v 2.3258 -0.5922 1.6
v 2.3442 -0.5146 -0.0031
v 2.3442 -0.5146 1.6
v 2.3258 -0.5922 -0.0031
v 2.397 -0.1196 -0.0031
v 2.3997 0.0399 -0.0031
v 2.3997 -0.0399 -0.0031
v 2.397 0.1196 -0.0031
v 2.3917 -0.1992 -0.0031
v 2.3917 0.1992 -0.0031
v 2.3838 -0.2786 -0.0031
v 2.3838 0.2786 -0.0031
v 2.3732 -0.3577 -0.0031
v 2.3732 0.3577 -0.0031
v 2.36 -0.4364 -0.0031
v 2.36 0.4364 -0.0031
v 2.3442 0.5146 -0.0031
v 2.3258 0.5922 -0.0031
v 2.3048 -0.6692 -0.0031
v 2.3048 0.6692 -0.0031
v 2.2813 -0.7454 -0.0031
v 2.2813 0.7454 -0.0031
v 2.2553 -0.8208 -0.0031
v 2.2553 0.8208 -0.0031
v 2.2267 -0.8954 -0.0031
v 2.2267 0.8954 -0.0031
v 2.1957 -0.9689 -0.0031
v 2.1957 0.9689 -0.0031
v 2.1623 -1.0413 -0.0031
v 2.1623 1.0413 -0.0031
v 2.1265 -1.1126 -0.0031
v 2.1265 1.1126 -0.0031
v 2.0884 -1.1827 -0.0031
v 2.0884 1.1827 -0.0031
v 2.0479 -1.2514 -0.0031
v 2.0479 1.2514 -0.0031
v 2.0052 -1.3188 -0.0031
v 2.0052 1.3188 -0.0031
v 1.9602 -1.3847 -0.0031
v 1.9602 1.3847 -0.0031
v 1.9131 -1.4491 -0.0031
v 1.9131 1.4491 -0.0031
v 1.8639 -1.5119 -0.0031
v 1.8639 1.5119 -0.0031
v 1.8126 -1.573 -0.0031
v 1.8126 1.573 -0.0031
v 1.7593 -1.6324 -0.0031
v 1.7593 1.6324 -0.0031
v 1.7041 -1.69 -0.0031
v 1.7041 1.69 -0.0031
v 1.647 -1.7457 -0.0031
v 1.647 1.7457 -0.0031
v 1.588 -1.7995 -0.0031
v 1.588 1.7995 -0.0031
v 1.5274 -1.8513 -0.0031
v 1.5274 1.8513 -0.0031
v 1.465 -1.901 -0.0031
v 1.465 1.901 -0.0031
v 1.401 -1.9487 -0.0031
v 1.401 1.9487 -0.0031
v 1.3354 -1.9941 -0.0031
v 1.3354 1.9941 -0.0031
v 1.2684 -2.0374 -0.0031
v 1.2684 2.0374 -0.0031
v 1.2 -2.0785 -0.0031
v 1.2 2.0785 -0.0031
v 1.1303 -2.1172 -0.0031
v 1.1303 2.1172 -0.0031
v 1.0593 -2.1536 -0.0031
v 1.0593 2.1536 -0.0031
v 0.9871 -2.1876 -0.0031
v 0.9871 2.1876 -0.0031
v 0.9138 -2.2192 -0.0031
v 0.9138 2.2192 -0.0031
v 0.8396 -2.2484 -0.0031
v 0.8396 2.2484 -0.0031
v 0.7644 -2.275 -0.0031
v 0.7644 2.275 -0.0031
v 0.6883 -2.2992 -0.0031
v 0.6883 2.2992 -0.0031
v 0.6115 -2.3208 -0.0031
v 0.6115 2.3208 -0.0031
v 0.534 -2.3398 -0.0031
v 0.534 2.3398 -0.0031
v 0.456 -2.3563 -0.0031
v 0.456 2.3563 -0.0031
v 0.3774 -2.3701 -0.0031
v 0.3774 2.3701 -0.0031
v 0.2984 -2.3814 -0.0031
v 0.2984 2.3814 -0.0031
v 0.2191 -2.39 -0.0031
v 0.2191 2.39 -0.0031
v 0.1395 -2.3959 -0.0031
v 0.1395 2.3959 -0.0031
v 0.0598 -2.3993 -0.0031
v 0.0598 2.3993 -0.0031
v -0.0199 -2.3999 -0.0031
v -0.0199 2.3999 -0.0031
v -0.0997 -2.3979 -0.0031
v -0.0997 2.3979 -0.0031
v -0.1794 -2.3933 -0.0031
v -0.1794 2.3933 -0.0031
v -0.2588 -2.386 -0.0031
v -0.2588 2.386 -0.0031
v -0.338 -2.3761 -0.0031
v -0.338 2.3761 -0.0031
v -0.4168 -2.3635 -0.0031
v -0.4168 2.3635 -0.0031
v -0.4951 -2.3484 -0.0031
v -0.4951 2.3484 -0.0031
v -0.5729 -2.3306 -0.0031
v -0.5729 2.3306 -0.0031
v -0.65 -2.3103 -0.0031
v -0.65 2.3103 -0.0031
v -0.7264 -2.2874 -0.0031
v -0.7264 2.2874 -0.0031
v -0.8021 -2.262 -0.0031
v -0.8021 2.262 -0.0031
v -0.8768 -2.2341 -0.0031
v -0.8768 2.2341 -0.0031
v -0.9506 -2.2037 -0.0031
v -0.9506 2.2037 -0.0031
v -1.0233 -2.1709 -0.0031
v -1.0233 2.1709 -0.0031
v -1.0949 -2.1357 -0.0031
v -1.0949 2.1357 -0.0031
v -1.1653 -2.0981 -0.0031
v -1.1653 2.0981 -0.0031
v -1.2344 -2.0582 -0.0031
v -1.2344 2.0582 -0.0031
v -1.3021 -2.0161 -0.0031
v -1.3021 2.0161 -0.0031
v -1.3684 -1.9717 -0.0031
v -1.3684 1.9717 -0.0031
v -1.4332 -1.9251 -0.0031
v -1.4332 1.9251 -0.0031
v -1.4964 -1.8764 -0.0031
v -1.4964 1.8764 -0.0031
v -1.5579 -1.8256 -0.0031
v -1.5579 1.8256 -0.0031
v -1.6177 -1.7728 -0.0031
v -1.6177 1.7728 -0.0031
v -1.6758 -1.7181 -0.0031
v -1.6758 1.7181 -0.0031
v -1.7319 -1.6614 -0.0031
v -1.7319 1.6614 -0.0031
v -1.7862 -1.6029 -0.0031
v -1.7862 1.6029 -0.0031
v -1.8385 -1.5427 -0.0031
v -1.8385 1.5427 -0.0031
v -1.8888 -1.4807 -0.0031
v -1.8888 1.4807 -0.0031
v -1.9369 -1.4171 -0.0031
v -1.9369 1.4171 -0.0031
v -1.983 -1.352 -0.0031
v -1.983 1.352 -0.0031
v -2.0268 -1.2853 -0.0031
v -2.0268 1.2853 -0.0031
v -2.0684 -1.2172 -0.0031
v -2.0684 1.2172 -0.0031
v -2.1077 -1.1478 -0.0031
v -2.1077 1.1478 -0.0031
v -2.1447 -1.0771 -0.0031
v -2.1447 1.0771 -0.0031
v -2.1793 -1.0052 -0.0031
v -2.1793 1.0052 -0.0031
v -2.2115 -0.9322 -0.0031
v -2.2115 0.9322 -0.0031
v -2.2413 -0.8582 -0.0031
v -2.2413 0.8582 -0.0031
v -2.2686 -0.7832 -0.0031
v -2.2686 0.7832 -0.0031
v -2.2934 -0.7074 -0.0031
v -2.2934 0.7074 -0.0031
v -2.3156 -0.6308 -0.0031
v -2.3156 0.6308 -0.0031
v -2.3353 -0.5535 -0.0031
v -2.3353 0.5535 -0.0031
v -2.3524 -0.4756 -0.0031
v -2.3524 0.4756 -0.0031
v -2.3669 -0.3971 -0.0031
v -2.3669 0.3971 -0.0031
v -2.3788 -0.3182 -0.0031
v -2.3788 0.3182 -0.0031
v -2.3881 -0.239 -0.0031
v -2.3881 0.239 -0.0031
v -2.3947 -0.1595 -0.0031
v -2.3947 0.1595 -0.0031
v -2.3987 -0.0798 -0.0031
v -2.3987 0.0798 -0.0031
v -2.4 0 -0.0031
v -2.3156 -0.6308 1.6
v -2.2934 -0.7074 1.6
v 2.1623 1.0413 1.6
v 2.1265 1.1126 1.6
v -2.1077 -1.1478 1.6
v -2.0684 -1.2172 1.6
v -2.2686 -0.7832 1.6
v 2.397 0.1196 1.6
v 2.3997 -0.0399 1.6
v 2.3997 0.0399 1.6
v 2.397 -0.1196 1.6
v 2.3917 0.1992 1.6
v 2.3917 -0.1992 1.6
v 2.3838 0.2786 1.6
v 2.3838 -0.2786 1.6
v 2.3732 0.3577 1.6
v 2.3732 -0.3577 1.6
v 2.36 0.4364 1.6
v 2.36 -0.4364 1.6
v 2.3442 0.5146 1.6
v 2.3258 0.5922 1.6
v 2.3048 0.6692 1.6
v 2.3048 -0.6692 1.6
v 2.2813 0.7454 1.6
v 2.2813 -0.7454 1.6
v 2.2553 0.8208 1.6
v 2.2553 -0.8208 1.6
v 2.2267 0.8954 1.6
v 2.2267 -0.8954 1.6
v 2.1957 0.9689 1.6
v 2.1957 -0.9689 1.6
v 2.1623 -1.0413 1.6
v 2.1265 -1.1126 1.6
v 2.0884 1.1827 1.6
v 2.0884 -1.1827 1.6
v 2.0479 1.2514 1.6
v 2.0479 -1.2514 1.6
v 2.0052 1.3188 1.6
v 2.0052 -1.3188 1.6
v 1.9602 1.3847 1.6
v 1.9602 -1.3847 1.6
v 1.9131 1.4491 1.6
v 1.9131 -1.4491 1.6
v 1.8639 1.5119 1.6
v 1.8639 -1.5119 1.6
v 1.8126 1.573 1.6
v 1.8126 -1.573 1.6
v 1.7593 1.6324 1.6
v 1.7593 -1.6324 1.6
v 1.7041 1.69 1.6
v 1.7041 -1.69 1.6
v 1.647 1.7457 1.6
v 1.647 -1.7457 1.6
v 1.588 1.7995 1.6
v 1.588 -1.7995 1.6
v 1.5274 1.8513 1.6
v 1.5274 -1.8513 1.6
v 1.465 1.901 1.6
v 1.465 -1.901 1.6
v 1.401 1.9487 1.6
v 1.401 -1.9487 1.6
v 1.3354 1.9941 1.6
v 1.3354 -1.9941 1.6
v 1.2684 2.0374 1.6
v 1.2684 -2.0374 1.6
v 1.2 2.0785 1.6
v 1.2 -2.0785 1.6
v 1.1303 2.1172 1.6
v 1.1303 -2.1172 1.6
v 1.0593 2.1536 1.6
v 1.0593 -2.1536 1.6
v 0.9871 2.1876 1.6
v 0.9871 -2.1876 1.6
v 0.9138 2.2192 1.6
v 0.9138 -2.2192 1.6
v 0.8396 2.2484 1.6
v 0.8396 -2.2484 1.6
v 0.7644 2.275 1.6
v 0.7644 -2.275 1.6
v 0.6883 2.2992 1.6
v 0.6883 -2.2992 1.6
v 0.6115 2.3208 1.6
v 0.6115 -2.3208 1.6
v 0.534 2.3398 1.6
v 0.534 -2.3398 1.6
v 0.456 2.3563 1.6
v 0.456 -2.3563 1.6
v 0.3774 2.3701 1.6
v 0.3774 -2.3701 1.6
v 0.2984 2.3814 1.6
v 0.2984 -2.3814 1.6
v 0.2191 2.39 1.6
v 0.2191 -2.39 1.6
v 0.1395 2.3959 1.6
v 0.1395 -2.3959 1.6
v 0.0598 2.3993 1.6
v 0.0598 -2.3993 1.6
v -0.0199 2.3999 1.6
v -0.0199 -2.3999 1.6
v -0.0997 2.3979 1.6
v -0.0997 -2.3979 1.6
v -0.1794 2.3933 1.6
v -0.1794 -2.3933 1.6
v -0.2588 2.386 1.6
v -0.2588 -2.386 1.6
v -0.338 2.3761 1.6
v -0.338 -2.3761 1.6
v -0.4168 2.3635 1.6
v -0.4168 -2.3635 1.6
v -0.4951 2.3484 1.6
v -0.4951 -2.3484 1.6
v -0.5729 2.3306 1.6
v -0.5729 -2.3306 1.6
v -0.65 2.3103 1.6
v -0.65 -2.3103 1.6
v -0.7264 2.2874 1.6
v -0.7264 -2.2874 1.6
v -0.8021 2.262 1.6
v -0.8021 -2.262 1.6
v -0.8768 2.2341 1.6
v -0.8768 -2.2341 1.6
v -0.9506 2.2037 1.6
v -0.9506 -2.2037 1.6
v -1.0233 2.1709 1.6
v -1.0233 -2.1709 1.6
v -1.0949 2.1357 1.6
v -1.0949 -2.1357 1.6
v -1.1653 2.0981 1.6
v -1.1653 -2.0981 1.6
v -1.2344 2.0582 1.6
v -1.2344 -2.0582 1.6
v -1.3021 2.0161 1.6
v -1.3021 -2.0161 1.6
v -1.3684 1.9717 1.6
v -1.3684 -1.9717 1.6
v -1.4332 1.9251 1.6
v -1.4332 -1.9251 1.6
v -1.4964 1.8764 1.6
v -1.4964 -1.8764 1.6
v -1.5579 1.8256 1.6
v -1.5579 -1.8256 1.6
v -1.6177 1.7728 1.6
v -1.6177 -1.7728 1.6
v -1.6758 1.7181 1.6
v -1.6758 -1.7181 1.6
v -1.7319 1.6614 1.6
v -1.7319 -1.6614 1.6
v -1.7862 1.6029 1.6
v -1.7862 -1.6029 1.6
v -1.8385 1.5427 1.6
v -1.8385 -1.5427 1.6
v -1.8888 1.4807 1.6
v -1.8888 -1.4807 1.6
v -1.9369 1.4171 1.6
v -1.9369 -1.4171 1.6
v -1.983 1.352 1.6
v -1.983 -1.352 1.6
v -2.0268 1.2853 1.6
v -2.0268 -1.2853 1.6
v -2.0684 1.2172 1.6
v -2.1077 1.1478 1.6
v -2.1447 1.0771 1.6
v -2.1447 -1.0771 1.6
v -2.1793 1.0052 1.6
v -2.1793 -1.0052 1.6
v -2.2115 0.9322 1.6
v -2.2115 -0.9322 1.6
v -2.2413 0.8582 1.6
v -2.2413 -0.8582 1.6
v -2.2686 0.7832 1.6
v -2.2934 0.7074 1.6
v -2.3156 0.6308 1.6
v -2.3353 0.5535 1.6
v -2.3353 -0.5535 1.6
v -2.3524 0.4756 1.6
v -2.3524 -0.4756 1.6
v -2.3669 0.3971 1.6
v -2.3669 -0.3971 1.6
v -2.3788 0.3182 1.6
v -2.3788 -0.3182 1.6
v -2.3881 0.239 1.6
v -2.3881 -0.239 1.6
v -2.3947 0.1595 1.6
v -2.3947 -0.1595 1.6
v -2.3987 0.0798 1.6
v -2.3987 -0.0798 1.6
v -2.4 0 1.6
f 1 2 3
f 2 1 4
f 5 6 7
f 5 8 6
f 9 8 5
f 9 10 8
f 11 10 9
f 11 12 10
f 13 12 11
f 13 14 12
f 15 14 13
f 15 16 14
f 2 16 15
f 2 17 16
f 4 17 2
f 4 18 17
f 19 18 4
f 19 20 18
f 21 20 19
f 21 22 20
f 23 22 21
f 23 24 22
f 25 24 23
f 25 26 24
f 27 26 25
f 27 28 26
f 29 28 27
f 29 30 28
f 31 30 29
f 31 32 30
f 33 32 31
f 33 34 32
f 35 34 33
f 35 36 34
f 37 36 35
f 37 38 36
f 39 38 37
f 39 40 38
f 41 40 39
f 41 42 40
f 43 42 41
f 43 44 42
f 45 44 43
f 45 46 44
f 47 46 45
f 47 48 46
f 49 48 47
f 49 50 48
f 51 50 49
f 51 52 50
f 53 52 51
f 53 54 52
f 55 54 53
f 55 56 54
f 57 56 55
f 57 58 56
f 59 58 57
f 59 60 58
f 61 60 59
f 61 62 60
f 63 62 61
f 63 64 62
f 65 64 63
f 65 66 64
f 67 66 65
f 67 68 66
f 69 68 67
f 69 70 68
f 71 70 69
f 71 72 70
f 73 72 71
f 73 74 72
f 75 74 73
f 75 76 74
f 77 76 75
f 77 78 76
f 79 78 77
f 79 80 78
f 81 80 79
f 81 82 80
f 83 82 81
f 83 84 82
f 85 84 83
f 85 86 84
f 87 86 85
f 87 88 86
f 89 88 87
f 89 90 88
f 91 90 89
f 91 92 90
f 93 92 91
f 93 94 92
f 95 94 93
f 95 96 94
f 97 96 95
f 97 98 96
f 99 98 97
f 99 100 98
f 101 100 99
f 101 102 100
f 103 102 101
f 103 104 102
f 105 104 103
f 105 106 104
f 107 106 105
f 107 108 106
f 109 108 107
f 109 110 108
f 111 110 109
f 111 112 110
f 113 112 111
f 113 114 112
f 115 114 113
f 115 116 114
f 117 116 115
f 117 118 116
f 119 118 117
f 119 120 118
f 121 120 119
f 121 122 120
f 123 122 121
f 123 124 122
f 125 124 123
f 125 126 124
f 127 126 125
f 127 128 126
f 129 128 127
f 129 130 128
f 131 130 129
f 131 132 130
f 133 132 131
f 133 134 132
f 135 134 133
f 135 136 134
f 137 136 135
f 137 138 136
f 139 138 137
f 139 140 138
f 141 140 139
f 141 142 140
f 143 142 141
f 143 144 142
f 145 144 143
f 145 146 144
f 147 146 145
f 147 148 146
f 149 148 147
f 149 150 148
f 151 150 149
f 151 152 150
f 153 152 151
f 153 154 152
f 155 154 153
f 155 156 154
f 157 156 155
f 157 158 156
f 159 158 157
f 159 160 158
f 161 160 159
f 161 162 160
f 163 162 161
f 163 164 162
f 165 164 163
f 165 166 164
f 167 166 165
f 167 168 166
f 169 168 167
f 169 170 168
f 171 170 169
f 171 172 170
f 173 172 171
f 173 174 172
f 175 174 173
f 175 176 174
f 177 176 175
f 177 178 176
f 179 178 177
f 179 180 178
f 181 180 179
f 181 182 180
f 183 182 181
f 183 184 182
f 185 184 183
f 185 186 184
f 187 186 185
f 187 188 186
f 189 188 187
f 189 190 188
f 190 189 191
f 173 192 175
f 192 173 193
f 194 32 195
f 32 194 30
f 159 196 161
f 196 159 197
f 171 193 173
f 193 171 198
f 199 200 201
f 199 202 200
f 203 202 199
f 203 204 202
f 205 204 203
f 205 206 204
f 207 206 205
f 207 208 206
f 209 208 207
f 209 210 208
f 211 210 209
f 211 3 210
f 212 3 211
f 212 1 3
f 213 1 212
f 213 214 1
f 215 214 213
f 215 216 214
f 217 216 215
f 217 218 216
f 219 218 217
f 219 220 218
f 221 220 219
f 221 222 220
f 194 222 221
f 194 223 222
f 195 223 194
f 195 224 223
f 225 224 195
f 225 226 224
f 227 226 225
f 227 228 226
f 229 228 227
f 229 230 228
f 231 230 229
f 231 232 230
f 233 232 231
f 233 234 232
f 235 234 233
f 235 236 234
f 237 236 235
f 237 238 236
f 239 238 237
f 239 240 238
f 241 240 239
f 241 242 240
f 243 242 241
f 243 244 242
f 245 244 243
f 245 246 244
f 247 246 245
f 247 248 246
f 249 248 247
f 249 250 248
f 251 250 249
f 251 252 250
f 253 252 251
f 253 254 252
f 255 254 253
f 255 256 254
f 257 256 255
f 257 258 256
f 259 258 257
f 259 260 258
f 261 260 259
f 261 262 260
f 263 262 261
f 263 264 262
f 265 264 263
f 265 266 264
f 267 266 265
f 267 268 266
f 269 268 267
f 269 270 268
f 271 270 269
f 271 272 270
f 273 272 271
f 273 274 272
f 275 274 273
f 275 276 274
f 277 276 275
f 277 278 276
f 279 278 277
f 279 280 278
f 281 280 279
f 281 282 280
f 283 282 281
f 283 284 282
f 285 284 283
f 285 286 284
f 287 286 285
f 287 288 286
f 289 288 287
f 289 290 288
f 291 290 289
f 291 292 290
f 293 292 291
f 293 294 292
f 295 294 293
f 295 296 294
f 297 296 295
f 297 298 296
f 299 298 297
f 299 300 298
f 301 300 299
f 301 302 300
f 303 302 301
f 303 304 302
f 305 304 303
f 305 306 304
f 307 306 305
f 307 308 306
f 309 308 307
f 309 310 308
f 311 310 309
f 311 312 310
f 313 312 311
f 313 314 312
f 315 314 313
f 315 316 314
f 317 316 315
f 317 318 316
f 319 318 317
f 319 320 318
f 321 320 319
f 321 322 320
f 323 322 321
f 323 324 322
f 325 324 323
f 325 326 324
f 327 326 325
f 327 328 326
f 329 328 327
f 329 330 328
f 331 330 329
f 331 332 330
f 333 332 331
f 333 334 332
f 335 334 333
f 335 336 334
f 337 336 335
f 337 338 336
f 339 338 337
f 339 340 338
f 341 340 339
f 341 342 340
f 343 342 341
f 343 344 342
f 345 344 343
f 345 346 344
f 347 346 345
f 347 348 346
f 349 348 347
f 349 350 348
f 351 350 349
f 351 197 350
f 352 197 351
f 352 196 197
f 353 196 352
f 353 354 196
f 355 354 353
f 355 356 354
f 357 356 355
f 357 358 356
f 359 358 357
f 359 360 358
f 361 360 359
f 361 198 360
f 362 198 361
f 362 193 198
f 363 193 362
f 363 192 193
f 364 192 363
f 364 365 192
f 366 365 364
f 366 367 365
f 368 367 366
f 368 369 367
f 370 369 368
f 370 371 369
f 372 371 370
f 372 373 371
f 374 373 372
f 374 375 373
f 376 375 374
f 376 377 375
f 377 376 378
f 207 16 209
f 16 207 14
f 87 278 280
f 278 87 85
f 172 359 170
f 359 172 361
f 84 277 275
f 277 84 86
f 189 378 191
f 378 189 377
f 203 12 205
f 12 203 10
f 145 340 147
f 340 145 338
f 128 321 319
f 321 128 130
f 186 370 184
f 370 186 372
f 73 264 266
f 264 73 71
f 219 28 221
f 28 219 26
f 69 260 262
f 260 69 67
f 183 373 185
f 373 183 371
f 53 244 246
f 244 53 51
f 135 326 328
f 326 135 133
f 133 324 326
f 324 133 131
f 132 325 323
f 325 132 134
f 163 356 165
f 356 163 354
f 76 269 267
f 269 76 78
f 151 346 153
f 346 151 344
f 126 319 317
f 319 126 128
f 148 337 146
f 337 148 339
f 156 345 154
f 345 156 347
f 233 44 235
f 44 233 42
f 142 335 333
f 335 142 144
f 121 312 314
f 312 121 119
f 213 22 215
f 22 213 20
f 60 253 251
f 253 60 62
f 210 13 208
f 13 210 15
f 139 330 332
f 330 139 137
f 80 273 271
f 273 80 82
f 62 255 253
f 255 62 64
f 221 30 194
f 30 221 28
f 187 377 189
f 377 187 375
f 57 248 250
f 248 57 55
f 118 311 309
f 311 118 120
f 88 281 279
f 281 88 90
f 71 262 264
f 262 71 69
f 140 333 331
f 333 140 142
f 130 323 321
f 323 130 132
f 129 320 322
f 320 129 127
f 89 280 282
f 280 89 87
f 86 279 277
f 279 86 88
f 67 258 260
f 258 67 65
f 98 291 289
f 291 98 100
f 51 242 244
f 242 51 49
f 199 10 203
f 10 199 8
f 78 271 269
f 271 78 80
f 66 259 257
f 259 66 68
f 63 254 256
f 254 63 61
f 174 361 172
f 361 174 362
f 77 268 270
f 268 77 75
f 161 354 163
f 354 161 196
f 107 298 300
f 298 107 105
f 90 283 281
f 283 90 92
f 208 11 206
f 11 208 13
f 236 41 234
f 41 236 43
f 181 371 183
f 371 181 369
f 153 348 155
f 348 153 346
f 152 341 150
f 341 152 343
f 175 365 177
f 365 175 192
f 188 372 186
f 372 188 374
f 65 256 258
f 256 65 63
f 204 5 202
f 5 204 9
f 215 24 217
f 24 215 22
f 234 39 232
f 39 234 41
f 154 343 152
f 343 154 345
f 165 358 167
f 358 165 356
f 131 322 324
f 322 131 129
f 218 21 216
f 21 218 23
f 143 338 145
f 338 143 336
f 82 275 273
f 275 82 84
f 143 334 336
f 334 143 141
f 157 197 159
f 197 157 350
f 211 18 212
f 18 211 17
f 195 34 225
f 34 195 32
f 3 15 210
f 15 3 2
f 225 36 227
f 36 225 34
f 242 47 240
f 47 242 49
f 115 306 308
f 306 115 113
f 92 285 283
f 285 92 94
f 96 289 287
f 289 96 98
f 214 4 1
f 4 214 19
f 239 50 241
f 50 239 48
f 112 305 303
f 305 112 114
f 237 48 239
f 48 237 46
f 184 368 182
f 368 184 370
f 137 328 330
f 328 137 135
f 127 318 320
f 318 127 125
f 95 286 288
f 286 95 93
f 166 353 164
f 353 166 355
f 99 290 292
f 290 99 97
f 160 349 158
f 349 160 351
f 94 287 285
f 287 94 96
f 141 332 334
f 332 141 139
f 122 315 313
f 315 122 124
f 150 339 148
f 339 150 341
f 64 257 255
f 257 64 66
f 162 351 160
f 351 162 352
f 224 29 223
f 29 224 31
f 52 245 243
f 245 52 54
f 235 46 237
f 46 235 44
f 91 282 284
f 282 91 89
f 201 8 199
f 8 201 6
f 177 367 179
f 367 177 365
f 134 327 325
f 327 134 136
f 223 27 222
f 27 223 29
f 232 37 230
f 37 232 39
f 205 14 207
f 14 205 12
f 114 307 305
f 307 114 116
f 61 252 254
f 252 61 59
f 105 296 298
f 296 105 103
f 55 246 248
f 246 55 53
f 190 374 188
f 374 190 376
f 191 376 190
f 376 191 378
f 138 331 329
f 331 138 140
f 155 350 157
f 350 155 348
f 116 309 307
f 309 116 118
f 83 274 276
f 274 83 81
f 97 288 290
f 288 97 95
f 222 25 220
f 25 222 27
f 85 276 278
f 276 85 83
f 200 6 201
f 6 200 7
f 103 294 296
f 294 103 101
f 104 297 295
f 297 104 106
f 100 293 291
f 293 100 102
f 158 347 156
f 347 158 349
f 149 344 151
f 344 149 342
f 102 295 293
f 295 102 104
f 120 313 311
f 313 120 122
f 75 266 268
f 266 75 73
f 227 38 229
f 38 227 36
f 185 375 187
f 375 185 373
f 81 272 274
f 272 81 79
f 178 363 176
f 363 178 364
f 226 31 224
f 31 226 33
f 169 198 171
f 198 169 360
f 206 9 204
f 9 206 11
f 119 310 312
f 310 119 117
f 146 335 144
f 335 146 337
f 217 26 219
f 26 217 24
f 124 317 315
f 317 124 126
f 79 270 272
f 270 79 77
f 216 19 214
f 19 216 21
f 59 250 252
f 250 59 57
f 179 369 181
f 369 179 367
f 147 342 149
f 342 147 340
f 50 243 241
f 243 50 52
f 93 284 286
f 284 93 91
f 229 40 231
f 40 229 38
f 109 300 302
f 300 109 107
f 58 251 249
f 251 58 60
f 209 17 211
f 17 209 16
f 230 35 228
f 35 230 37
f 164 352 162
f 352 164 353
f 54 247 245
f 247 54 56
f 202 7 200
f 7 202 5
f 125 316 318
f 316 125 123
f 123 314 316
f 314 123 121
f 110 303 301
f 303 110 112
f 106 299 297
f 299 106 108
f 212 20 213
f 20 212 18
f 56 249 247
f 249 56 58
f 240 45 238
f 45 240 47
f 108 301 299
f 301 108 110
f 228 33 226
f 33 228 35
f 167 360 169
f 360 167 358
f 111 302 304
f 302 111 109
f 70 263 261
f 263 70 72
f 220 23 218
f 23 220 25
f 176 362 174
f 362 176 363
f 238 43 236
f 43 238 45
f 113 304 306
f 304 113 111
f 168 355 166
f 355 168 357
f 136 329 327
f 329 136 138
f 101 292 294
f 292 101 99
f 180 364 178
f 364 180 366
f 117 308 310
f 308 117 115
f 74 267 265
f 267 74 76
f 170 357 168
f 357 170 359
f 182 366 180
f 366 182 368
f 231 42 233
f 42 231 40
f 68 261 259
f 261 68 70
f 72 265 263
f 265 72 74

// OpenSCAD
use <../lib.scad>
use <u9502.scad>
use <u9503.scad>
$fa=1; $fs=0.2;
function ldraw_lib__u9503c01(realsolid=false) = [
// 0 Door  1 x  3 x  3 Right with Window and Horizontal Handle
// 0 Name: u9503c01.dat
// 0 Author: Alex Taylor [anathema]
// 0 !LDRAW_ORG Shortcut UPDATE 2020-01
// 0 !LICENSE Licensed under CC BY 2.0 and CC BY 4.0 : see CAreadme.txt
// 
// 0 BFC CERTIFY CCW
  [0,"BFC","CERTIFY"],
  [0,"BFC","CCW"],
// 
// 0 !HISTORY 2020-06-28 [PTadmin] Official Update 2020-01
// 
// 
// 1 47 0 0 0 1 0 0 0 1 0 0 0 1 u9502.dat
  [1,47,0,0,0,1,0,0,0,1,0,0,0,1, ldraw_lib__u9502(realsolid)],
// 1 16 0 0 0 1 0 0 0 1 0 0 0 1 u9503.dat
  [1,16,0,0,0,1,0,0,0,1,0,0,0,1, ldraw_lib__u9503(realsolid)],
// 0
];
module ldraw_lib__u9503c01(step=0, col=false, unit=2/5, alt=false, line=0.2, solid=!$preview)
    makepoly(ldraw_lib__u9503c01(solid), step=step, col=col, unit=unit, alt=alt, line=line, solid=solid);
ldraw_lib__u9503c01(line=0.2);
